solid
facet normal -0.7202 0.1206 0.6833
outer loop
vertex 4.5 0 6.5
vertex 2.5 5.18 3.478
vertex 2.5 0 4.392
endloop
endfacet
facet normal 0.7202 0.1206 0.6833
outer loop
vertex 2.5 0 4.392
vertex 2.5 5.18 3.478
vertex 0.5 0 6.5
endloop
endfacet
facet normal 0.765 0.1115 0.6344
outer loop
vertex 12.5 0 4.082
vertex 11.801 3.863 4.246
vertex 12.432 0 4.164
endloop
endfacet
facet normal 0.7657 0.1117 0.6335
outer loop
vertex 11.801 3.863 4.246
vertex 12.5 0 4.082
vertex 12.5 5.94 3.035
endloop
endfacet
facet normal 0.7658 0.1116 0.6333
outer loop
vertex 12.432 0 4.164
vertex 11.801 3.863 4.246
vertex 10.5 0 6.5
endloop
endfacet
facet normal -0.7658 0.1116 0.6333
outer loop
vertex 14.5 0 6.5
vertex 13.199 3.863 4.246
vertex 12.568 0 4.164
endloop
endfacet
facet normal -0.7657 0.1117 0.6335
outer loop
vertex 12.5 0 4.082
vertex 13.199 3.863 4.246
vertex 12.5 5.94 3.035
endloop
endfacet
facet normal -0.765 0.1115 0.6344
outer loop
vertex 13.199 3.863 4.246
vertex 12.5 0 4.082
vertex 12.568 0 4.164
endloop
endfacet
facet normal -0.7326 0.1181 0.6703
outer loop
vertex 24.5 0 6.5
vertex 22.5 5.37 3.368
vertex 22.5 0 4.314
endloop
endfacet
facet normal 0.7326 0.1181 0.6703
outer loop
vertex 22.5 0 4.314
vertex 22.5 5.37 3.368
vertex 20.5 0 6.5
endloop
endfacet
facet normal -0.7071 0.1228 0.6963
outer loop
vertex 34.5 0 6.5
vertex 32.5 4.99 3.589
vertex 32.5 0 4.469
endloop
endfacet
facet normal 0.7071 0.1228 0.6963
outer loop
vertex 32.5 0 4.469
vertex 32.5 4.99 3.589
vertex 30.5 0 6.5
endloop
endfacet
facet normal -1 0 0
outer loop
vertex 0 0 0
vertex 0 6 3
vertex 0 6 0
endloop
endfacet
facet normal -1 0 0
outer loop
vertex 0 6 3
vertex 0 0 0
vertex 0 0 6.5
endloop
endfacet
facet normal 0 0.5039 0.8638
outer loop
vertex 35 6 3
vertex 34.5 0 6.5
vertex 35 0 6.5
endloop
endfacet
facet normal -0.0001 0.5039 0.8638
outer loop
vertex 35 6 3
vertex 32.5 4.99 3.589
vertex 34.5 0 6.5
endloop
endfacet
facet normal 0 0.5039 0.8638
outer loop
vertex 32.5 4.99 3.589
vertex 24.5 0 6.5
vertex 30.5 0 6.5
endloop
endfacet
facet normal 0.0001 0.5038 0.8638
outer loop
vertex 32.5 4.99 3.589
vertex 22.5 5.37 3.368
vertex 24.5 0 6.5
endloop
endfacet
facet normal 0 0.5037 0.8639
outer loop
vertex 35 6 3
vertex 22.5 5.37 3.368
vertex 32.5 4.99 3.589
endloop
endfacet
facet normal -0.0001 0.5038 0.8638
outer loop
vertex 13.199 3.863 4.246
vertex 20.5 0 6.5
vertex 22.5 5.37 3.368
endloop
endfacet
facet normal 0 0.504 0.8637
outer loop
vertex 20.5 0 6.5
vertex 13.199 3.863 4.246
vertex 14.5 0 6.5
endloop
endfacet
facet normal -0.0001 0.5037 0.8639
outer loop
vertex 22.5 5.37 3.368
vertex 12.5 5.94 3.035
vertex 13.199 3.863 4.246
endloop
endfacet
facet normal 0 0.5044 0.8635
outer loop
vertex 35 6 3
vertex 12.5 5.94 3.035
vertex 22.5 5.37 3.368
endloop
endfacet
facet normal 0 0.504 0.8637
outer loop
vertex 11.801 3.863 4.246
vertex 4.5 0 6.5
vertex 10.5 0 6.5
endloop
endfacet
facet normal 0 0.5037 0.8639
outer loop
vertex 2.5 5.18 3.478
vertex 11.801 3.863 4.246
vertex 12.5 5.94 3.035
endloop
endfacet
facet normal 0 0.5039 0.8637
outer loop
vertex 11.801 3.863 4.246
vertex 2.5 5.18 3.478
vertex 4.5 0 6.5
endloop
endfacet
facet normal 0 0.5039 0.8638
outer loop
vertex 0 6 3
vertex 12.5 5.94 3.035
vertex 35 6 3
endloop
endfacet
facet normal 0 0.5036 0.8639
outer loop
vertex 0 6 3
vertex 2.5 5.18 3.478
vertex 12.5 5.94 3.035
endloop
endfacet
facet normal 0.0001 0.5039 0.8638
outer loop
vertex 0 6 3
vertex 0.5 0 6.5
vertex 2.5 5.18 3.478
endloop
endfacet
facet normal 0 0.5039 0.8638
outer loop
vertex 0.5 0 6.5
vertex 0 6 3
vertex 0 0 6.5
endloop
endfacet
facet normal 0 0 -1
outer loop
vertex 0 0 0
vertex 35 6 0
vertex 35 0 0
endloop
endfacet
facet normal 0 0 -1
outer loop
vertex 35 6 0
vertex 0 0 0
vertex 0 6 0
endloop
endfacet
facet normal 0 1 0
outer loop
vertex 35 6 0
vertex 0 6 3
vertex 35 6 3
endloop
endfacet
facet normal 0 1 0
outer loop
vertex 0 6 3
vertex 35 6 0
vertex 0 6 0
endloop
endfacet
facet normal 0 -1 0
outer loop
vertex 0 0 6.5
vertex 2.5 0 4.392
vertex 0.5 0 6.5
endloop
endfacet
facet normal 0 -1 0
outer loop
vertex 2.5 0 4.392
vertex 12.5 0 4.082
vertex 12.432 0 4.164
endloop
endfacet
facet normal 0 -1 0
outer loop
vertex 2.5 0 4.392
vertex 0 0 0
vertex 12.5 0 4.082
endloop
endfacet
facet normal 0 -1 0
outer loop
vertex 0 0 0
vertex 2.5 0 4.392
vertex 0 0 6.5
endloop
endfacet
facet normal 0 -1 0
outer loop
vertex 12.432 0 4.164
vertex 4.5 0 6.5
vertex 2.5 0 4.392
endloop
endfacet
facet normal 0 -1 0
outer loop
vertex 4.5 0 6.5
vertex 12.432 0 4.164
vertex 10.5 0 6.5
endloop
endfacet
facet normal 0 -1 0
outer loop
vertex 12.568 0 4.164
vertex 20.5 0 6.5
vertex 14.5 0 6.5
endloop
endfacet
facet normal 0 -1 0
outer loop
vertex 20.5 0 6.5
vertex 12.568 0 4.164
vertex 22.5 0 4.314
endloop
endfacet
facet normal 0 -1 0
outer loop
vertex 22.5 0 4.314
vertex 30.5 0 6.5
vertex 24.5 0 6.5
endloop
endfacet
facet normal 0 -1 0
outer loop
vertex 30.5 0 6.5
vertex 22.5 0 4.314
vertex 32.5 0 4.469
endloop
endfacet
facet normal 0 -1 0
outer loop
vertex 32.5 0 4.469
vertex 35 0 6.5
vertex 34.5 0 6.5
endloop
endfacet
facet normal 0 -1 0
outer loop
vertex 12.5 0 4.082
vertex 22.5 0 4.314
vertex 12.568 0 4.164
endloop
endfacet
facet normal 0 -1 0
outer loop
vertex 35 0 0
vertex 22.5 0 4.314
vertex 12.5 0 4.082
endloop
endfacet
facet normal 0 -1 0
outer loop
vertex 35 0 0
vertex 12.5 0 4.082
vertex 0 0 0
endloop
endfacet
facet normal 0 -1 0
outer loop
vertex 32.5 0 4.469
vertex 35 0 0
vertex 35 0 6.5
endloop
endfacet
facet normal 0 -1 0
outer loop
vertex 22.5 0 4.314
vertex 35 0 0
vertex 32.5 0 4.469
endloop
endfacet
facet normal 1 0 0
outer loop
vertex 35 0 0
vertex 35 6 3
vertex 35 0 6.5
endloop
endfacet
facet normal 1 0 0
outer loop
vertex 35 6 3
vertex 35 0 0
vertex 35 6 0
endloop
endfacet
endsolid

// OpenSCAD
h = 6.5;
h2 = 3;
w = 6;
num_strings = 4;
string_dist = 10;
l = 35;
string_dias = [0.5588, 0.8636, 0.635, 0.4826];
msd = min(string_dias);
notch_depth = [2+string_dias[0]-msd,2+string_dias[1]-msd,2+string_dias[2]-msd,2+string_dias[3]-msd];
notch_width = 4;
notch_angle = 10;

//h = 4.5;
//h2 = 2;
//w = 6;
//num_strings = 4;
//string_dist = 38/3;
//l = 62;
//string_dias = [0.5588, 0.8636, 0.635, 0.4826];
//msd = min(string_dias);
//notch_depth = [2+string_dias[3]-msd,2+string_dias[2]-msd,2+string_dias[1]-msd,2+string_dias[0]-msd];
//notch_width = 4;
//notch_angle = 10;



margin = (l - ((num_strings-1)*string_dist))/2;



difference() {
    translate([0,w,0])
        rotate([0,-90,180])
            linear_extrude(l)
                polygon([[0,0],[0,w],[h,w],[h2,0]]);

    for(i = [0:num_strings-1]) {
        translate([margin+i*string_dist,0,h]) {
            rotate([-90+notch_angle,180,0])
                linear_extrude(w*2)
                    polygon([[-notch_width/2,0],[notch_width/2,0],[0,-notch_depth[i]]]);

        }
    }
}
